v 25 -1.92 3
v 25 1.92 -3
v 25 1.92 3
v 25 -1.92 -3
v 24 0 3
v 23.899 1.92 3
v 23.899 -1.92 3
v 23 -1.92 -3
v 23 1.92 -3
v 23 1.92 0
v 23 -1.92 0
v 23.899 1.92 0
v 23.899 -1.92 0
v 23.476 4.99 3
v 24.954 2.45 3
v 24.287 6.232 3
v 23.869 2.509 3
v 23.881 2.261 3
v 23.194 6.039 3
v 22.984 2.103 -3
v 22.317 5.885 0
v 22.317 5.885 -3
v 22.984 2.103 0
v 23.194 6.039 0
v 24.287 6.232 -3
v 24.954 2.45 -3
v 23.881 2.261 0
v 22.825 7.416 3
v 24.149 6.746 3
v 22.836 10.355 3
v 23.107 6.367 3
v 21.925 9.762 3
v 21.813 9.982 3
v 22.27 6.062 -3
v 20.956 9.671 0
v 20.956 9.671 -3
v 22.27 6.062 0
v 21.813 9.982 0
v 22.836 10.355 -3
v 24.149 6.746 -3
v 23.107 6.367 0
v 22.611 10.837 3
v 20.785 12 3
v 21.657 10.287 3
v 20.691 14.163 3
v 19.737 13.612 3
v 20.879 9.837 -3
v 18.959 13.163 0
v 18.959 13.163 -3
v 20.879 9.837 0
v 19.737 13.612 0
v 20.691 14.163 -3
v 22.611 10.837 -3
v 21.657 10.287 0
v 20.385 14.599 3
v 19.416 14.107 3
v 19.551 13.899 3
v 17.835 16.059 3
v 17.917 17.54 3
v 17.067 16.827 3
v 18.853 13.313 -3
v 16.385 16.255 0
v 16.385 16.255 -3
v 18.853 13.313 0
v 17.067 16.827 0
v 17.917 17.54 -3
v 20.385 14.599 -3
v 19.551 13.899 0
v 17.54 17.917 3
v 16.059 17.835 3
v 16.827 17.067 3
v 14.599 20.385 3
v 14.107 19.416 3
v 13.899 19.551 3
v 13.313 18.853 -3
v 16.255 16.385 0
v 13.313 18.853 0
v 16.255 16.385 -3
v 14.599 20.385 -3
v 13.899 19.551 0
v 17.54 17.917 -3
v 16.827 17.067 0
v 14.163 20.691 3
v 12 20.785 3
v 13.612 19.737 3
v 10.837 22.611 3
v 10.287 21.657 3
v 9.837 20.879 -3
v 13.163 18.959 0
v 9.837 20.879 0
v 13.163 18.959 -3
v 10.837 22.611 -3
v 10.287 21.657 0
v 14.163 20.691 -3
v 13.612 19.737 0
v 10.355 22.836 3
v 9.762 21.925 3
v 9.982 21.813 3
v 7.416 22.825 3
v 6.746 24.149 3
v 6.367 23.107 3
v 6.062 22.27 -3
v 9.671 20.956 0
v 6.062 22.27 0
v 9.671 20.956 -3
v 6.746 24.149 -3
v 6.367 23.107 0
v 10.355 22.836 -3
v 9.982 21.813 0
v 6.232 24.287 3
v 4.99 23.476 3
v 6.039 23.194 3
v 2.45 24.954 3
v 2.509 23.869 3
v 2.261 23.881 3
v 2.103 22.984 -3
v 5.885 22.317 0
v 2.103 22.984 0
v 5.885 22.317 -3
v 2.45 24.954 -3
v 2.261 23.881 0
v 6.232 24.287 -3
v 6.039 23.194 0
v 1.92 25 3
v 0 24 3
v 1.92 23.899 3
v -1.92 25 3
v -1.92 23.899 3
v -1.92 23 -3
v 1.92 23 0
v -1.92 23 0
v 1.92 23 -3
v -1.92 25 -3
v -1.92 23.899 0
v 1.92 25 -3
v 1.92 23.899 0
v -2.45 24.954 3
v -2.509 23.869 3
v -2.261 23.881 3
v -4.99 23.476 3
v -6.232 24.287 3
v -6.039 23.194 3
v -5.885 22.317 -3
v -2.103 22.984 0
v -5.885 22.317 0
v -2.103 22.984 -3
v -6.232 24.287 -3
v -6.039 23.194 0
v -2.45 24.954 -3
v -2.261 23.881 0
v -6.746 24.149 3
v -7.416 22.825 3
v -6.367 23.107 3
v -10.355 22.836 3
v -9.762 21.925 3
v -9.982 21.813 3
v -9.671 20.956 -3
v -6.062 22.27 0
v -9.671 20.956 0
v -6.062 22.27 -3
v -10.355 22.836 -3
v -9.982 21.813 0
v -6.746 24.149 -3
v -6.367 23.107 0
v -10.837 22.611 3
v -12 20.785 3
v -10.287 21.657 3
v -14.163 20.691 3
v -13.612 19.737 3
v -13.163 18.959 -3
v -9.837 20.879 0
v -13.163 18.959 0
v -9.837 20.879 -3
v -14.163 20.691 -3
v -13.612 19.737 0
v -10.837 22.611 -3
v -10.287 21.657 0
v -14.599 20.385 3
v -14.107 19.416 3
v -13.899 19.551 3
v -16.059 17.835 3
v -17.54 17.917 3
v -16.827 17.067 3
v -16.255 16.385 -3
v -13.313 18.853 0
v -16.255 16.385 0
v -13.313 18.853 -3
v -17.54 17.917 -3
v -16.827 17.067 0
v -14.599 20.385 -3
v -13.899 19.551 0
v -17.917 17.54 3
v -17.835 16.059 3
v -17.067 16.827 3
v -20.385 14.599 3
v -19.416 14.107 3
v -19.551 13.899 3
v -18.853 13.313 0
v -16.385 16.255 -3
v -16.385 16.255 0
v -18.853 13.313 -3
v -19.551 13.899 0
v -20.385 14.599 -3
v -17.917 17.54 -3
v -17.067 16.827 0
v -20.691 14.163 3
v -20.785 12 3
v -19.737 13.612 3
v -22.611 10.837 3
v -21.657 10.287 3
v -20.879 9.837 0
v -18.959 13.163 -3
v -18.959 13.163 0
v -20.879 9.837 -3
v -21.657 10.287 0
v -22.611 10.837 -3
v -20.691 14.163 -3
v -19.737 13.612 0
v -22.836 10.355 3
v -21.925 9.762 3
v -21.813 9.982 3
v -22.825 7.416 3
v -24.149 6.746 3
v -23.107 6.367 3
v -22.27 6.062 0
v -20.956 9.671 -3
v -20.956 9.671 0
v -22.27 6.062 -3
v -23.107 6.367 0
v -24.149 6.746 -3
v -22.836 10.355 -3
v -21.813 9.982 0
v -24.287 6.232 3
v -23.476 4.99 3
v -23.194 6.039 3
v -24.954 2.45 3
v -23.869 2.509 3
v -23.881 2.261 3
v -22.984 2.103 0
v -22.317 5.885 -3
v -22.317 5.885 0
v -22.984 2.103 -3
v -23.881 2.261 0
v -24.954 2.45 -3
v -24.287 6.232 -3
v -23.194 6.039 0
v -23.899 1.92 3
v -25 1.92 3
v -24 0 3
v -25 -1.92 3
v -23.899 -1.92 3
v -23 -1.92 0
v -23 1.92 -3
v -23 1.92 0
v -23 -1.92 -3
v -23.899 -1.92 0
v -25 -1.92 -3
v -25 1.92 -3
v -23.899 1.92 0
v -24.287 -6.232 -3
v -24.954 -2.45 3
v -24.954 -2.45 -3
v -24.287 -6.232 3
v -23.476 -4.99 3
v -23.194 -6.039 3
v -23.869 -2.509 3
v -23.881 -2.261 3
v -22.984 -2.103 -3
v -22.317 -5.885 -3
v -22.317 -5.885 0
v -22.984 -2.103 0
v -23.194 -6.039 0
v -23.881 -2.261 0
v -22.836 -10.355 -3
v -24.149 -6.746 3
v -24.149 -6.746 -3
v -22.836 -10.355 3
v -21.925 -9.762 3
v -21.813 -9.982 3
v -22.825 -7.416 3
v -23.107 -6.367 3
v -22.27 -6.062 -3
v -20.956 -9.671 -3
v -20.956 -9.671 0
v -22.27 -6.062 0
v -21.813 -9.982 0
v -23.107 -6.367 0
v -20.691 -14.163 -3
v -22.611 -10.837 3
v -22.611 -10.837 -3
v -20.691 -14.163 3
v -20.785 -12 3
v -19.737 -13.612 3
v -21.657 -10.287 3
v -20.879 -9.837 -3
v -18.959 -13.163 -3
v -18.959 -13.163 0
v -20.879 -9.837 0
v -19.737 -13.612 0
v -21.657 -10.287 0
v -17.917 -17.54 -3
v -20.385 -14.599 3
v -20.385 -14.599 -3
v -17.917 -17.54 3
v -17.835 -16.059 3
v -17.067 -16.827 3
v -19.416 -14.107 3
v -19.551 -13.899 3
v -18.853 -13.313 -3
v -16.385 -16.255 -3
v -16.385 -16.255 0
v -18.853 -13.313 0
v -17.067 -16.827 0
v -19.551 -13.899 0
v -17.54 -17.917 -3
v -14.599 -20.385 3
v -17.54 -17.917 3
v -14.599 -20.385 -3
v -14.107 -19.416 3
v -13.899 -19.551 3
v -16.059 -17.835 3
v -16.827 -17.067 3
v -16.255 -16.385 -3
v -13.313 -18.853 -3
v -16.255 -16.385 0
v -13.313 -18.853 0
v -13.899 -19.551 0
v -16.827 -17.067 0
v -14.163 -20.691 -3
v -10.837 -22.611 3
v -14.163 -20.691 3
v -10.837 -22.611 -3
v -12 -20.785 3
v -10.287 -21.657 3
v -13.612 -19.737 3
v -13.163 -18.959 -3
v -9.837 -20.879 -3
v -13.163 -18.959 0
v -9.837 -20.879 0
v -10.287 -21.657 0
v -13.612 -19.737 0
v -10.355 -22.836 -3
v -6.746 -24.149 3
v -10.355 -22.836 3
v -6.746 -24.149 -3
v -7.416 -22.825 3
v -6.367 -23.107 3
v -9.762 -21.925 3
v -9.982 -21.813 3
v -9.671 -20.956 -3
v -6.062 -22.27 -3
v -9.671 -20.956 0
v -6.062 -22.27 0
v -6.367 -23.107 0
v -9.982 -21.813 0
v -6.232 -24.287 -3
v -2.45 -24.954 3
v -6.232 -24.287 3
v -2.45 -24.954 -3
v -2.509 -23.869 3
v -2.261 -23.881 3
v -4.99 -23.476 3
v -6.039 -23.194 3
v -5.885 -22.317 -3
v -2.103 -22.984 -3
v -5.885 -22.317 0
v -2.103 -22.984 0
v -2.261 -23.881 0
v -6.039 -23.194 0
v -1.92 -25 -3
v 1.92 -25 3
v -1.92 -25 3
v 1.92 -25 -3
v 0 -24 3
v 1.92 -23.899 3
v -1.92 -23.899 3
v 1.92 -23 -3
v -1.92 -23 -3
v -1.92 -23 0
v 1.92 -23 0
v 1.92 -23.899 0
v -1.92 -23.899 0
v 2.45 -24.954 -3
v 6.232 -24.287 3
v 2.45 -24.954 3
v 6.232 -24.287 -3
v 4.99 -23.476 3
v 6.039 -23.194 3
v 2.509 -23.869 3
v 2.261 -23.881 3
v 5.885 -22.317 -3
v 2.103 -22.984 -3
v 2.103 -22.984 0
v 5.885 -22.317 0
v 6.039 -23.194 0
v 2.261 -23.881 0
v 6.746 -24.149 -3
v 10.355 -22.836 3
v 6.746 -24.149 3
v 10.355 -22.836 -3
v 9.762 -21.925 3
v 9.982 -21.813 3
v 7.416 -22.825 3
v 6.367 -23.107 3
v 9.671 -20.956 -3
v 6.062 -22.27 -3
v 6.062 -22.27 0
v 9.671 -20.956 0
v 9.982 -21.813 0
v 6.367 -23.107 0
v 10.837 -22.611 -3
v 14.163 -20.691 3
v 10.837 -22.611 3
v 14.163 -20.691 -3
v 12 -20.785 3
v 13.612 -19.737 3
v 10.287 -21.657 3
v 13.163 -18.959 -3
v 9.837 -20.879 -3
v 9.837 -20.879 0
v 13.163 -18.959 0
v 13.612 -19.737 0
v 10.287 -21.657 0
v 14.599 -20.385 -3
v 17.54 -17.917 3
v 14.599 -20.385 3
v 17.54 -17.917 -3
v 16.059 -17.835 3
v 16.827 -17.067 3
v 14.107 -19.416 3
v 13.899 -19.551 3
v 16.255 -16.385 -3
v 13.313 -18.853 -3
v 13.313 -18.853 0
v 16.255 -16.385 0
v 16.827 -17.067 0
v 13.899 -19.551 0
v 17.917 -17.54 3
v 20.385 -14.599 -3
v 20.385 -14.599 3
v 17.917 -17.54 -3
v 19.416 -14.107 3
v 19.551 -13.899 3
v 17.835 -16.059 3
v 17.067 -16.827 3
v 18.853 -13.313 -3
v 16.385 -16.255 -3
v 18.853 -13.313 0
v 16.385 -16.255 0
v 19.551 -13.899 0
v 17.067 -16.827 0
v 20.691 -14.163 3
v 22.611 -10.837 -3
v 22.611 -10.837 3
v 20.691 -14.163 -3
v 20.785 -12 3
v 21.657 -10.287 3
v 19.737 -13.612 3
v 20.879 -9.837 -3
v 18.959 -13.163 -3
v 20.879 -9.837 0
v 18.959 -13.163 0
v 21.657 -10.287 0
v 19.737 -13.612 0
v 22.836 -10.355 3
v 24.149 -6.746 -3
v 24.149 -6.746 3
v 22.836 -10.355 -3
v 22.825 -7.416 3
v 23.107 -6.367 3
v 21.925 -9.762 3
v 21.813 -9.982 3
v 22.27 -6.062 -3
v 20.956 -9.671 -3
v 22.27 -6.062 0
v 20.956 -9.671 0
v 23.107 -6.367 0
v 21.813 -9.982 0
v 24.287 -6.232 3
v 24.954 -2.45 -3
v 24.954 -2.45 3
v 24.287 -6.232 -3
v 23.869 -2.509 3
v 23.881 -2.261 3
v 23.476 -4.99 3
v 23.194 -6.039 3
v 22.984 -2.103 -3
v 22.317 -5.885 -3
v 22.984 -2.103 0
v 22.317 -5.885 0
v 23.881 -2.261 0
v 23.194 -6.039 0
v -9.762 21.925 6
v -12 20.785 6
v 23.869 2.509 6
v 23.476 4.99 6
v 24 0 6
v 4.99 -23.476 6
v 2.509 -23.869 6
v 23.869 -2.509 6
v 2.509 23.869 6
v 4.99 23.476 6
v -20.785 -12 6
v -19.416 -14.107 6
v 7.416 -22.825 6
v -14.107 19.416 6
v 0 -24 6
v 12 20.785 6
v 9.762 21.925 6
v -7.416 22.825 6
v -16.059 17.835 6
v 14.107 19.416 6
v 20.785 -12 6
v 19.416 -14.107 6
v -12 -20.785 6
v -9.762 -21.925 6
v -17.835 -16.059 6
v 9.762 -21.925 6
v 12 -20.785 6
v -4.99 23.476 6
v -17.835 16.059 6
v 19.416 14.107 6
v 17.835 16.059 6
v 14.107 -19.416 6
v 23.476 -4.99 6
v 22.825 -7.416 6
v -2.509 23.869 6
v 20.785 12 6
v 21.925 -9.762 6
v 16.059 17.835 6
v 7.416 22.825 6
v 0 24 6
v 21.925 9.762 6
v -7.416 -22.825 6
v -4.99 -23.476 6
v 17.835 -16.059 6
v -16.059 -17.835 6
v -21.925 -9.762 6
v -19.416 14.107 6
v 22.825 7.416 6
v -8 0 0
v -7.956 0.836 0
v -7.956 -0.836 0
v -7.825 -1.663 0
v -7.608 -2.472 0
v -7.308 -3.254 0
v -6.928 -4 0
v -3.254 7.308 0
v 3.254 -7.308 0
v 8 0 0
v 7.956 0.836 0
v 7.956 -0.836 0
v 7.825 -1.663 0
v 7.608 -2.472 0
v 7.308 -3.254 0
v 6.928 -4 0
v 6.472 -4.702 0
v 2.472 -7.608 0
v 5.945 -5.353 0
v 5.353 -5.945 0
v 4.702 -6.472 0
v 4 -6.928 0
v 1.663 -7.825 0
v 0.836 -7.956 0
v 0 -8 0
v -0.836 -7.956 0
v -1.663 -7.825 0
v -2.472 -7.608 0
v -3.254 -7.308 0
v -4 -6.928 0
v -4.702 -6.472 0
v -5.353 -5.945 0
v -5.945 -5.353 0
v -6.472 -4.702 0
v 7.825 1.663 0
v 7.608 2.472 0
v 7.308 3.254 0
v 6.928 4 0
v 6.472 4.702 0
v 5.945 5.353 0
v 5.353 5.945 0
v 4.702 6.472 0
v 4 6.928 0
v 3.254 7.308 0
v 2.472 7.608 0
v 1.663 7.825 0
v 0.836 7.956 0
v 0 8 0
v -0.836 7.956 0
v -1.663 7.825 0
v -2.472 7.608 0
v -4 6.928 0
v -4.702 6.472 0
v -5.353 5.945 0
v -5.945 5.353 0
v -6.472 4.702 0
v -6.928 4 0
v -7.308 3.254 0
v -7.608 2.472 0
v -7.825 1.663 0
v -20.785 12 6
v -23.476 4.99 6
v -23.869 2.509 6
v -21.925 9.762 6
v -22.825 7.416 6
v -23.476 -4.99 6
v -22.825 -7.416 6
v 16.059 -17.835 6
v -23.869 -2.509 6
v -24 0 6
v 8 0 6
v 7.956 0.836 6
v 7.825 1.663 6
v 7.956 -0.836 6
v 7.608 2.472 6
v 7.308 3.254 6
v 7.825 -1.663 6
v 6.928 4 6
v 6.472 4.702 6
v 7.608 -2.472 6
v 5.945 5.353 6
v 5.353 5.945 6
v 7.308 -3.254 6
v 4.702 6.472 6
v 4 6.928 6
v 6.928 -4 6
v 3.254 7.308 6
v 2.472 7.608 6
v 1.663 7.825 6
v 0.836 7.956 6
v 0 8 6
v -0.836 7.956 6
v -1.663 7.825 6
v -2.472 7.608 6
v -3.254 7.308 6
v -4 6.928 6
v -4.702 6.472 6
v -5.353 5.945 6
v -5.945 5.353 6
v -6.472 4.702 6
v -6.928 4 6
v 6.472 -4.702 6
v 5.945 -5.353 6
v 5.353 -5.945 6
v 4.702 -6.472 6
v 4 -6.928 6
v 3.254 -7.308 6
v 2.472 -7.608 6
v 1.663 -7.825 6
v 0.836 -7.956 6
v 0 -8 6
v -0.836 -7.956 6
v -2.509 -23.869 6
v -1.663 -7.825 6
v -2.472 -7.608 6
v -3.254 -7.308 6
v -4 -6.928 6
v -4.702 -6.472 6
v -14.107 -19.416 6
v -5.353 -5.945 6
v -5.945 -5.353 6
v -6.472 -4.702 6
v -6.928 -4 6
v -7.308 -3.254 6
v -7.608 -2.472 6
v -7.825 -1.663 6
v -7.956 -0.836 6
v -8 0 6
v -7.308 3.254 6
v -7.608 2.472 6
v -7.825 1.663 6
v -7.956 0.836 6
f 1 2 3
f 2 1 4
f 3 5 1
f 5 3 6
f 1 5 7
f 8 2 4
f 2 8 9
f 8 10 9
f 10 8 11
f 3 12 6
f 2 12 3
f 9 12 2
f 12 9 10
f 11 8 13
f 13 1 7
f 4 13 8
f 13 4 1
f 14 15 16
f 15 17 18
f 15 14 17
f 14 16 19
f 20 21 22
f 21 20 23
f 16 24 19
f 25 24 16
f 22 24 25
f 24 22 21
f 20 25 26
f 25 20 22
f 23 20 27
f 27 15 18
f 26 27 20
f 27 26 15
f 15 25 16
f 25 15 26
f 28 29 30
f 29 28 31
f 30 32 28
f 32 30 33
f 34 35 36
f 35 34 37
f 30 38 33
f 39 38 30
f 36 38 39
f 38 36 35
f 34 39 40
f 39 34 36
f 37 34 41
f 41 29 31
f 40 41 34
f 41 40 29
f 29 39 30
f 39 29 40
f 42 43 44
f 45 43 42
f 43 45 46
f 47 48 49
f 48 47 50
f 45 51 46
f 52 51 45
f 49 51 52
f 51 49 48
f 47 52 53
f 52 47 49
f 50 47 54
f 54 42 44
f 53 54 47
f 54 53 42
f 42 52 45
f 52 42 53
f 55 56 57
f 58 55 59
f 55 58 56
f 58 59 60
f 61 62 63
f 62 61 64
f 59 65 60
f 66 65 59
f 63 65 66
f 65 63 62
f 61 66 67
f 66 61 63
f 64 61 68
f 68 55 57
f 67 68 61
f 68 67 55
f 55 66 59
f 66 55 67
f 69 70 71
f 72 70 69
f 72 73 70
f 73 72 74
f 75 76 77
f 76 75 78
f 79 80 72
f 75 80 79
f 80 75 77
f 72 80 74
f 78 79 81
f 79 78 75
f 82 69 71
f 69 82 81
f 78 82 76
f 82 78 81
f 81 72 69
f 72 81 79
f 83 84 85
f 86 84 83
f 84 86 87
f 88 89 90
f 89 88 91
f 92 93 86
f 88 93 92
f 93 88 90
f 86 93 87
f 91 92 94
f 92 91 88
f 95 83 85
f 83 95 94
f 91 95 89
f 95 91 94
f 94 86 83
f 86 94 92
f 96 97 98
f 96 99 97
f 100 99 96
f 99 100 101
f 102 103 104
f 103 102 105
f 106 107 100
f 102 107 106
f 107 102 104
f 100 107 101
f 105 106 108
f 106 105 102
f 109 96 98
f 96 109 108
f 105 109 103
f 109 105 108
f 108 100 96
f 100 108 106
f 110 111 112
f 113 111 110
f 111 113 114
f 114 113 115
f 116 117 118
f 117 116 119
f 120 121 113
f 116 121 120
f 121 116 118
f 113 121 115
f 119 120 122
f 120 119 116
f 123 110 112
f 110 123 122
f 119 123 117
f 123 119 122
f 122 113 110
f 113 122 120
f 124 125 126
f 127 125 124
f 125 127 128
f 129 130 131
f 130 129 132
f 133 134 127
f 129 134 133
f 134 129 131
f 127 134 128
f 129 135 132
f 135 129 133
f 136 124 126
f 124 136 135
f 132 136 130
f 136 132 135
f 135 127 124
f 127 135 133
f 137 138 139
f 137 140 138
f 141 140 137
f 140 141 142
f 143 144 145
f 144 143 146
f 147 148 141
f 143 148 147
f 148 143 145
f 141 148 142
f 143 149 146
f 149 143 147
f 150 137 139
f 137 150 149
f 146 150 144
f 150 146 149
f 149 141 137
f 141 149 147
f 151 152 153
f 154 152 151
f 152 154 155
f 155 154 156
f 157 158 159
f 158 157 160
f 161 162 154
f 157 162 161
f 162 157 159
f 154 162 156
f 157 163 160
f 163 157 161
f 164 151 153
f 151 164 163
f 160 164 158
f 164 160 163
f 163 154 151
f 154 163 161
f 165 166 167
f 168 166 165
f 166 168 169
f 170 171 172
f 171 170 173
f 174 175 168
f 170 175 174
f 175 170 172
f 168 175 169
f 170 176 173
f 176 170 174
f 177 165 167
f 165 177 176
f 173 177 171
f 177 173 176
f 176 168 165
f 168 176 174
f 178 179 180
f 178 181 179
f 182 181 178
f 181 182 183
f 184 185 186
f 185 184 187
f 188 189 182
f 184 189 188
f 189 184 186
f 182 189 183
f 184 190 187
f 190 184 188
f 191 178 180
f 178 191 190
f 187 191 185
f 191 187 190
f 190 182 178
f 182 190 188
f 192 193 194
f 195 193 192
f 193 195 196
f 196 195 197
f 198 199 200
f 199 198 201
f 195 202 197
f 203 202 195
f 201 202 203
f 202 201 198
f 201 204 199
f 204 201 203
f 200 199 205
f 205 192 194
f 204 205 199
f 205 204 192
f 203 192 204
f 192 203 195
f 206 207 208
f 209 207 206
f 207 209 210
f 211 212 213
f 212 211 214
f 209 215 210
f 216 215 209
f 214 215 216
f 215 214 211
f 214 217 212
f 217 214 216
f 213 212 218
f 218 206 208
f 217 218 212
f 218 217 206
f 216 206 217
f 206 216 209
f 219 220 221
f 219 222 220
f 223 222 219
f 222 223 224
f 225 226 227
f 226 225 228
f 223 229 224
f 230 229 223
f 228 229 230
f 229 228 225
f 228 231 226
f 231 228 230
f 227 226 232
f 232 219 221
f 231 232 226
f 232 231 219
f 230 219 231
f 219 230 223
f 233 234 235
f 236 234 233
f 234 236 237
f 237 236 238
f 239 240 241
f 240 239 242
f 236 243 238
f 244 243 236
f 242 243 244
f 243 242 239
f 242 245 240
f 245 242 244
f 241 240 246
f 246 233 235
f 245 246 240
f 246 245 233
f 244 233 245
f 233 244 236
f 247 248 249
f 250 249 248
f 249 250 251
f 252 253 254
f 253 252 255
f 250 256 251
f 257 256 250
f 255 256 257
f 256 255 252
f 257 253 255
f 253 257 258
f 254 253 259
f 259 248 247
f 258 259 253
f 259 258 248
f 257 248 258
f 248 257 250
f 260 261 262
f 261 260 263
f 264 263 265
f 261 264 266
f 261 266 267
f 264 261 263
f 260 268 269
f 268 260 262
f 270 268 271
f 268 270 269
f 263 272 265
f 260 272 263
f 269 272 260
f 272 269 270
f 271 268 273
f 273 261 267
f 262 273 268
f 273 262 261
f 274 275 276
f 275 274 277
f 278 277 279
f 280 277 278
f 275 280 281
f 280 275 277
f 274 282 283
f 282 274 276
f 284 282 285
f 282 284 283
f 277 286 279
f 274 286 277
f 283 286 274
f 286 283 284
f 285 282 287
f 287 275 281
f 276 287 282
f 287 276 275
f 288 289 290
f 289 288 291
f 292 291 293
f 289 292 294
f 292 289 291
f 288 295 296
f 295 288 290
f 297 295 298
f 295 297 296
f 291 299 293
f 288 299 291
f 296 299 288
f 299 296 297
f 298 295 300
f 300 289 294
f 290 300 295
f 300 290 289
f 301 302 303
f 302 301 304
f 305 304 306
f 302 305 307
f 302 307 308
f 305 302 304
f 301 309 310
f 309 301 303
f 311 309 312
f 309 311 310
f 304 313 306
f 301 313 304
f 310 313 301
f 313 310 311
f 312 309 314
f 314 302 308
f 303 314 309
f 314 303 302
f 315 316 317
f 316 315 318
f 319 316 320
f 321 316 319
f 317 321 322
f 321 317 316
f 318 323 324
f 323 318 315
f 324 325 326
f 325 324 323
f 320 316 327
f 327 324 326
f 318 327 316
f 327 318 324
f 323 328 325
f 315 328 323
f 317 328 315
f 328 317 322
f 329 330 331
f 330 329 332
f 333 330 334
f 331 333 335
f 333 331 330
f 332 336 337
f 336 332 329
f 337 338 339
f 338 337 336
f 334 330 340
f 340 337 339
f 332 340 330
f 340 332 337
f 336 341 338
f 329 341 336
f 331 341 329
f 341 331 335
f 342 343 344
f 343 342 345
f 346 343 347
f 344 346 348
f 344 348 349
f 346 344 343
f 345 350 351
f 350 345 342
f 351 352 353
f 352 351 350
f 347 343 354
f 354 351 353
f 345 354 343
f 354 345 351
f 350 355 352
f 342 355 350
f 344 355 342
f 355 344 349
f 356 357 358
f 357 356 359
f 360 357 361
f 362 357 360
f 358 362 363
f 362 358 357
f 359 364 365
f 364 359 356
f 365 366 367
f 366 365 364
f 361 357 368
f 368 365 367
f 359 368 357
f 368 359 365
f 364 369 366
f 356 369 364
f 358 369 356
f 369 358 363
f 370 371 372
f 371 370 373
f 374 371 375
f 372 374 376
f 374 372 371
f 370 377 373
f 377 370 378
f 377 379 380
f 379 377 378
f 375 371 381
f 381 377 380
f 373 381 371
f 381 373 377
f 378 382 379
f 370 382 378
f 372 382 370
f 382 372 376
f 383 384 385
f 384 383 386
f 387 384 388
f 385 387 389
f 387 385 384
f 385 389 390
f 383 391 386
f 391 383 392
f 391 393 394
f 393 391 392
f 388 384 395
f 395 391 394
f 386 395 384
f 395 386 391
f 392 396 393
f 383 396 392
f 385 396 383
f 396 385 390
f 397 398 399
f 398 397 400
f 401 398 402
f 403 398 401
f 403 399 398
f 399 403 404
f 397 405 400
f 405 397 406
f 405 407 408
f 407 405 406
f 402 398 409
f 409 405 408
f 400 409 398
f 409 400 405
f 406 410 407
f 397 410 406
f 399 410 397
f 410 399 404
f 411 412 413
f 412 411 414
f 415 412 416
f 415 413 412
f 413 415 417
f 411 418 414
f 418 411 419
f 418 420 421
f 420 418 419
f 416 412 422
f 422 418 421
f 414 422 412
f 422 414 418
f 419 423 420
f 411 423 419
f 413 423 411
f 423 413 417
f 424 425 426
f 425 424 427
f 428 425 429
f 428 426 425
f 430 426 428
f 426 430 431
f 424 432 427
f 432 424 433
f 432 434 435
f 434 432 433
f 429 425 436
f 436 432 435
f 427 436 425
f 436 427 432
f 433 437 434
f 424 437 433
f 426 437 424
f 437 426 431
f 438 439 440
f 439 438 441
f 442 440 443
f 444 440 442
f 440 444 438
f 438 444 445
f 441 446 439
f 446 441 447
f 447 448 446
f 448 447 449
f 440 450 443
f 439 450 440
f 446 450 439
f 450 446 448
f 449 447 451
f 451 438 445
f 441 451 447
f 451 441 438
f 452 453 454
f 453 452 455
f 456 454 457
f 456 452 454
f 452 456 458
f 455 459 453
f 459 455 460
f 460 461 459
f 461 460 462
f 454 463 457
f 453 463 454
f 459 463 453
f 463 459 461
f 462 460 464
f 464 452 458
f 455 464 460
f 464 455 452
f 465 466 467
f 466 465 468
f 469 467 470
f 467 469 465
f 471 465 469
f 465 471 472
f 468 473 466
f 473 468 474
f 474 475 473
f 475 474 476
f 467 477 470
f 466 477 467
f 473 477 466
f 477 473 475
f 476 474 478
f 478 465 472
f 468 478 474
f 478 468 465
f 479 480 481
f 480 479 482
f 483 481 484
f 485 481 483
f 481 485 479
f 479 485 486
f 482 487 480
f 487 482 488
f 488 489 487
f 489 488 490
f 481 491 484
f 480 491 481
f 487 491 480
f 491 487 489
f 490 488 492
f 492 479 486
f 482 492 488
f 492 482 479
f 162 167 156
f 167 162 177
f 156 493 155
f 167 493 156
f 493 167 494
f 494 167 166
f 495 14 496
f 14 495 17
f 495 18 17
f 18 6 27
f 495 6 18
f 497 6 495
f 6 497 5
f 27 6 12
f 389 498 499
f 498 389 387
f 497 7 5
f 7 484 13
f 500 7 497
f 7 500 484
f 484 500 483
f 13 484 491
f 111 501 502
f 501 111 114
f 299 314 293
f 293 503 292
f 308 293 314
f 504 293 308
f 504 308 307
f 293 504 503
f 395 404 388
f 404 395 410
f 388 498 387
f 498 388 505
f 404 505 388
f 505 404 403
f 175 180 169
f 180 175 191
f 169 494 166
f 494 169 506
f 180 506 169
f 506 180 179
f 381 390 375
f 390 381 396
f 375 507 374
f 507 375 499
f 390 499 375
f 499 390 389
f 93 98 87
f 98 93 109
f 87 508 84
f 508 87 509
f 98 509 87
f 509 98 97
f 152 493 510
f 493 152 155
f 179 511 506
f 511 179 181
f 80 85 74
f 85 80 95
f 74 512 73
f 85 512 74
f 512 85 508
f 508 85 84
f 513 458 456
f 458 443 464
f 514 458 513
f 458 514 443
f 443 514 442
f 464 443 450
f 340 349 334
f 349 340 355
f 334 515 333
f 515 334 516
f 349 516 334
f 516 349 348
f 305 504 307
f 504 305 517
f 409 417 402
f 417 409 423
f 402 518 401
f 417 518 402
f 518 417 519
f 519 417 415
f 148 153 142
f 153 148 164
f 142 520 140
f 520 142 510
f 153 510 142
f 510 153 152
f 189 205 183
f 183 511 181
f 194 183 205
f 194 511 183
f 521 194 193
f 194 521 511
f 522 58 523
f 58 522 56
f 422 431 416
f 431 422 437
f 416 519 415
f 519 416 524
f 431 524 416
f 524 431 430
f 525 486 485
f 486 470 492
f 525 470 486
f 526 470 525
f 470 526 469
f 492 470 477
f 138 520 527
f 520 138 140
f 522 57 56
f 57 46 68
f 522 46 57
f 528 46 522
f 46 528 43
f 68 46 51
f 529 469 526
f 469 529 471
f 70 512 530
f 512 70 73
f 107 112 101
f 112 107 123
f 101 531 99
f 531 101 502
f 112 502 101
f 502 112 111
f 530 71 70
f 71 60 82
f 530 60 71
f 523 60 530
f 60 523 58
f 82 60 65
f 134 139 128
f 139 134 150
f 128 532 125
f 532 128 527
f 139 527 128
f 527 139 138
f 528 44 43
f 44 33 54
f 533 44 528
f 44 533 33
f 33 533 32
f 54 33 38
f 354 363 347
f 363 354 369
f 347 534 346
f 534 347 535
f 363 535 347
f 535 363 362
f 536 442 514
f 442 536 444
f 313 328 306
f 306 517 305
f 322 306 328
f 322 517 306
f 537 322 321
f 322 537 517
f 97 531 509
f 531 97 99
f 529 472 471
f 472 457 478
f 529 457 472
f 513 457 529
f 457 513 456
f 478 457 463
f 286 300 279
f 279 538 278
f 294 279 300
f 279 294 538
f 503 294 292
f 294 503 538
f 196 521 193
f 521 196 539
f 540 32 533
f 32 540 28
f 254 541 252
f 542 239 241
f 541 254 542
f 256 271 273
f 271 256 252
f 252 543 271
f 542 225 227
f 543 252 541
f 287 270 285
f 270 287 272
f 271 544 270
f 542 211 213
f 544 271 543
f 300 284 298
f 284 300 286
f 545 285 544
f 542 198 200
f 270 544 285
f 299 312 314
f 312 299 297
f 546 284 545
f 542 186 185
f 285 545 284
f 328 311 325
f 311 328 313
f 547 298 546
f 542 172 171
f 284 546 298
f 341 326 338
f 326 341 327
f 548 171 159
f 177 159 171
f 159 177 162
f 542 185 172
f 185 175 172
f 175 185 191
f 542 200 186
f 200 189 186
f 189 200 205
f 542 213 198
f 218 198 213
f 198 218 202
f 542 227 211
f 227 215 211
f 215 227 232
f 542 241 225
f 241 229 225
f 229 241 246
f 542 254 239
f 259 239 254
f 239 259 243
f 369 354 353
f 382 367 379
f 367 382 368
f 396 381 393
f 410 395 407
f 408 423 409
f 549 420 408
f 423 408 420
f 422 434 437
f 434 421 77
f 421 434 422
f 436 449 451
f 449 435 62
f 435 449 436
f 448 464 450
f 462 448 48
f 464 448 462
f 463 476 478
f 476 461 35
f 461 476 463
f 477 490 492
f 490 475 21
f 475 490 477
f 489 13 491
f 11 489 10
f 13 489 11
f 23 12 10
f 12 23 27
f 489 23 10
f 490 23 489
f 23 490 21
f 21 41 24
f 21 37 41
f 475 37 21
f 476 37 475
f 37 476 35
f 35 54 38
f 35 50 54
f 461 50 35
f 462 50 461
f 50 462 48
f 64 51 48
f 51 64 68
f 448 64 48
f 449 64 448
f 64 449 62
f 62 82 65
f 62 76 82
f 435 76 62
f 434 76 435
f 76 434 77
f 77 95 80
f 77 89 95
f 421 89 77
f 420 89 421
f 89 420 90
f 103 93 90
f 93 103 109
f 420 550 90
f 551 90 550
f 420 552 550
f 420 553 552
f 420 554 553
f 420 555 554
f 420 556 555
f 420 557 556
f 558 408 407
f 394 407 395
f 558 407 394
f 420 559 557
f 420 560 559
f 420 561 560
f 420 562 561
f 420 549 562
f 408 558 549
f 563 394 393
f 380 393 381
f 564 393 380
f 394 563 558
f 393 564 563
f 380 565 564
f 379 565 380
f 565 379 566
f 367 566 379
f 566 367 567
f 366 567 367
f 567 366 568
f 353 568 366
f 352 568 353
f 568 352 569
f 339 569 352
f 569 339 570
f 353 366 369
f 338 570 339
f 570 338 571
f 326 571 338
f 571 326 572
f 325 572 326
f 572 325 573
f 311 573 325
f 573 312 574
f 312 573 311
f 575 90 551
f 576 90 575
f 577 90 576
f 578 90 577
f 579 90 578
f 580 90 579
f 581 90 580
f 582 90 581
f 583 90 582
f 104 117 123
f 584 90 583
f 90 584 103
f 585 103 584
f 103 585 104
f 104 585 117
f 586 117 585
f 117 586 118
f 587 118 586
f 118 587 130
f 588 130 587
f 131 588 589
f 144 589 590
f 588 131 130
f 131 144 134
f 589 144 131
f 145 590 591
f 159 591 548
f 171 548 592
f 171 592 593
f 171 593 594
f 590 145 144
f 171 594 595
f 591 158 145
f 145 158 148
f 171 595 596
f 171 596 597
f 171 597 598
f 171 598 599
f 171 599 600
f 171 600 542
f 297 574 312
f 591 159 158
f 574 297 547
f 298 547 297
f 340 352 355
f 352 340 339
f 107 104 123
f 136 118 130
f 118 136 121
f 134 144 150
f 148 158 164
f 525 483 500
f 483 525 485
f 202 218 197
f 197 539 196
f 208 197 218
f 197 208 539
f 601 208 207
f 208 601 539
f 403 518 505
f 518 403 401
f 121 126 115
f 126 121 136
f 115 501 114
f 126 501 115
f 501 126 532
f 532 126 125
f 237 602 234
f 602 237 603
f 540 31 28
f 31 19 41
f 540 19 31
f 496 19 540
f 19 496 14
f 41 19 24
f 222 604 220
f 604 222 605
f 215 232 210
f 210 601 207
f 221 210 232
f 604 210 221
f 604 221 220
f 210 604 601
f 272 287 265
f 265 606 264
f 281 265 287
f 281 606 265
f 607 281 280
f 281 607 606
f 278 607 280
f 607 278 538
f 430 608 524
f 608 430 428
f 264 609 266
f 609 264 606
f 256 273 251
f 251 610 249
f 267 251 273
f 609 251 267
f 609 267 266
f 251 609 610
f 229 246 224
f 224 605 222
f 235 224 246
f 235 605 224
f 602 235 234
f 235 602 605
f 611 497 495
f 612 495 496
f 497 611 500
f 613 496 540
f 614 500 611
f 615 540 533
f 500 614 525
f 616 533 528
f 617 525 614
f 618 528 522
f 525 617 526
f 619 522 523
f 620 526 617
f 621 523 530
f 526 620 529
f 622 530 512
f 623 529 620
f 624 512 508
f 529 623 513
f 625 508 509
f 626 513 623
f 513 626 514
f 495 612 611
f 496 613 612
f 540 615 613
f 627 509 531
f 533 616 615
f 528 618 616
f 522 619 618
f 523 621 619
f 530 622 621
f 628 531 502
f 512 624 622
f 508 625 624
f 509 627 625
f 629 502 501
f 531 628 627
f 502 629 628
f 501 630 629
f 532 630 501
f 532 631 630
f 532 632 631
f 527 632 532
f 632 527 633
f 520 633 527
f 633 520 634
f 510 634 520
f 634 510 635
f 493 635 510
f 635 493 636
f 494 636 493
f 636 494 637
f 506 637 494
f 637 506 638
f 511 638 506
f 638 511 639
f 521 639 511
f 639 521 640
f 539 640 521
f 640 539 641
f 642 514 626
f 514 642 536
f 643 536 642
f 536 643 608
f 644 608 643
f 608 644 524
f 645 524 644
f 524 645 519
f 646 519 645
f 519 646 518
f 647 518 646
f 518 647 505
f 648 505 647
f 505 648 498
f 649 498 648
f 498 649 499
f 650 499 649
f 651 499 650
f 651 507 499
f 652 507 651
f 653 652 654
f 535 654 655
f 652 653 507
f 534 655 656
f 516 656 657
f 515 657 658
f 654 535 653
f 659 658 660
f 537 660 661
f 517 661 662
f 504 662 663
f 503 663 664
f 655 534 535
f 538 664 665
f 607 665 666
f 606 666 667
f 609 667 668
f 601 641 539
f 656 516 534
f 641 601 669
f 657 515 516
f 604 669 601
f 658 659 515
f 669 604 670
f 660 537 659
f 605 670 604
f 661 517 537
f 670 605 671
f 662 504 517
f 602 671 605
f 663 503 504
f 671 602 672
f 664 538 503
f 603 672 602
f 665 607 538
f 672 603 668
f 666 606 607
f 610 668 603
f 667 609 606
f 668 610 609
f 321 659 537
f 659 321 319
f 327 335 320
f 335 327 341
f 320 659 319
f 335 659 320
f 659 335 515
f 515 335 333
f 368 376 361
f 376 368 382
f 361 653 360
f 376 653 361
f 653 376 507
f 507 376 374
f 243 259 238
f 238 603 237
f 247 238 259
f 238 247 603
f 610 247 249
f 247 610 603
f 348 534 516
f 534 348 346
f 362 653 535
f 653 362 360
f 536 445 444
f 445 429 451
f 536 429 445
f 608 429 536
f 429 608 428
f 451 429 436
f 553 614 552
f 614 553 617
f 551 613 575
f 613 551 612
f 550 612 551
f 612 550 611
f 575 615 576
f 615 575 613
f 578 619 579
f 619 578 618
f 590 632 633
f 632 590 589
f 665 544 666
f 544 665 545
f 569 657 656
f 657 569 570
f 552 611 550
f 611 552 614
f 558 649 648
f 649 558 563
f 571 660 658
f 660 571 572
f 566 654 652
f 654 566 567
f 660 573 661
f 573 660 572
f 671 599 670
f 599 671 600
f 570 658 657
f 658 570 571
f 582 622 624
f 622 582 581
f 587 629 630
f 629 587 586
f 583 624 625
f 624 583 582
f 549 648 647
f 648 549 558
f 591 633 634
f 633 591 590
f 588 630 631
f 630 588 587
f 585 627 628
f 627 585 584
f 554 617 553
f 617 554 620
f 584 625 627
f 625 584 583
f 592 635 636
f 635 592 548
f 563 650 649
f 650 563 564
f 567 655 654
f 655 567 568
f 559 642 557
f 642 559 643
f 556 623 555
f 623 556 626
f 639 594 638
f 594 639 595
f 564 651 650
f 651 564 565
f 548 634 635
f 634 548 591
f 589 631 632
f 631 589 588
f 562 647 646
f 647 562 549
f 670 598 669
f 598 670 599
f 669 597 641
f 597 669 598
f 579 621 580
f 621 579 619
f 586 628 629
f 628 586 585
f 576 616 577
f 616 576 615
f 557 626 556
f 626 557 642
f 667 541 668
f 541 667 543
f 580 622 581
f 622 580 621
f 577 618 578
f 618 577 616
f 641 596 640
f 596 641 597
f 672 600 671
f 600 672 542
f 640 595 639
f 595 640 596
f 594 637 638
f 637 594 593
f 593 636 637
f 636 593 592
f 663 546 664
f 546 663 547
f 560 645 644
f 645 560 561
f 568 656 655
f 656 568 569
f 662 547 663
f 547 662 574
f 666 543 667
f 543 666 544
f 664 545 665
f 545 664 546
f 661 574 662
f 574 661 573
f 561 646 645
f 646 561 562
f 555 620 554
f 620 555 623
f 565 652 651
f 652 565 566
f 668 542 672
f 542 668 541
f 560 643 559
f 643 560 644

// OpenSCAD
// Gear blank with external locator teeth.
$fn = 60;
eps = 0.02;
bore_d = 16;
root_d = 48;
teeth = 36;
thickness = 6;
difference() { union() { cylinder(d=root_d,h=thickness); for(i=[0:teeth-1]) rotate([0,0,i*360/teeth]) translate([root_d/2,0,0]) cube([2,max(2,root_d*0.08),thickness],center=true); } translate([0,0,-eps]) cylinder(d=bore_d,h=thickness+2*eps); }
